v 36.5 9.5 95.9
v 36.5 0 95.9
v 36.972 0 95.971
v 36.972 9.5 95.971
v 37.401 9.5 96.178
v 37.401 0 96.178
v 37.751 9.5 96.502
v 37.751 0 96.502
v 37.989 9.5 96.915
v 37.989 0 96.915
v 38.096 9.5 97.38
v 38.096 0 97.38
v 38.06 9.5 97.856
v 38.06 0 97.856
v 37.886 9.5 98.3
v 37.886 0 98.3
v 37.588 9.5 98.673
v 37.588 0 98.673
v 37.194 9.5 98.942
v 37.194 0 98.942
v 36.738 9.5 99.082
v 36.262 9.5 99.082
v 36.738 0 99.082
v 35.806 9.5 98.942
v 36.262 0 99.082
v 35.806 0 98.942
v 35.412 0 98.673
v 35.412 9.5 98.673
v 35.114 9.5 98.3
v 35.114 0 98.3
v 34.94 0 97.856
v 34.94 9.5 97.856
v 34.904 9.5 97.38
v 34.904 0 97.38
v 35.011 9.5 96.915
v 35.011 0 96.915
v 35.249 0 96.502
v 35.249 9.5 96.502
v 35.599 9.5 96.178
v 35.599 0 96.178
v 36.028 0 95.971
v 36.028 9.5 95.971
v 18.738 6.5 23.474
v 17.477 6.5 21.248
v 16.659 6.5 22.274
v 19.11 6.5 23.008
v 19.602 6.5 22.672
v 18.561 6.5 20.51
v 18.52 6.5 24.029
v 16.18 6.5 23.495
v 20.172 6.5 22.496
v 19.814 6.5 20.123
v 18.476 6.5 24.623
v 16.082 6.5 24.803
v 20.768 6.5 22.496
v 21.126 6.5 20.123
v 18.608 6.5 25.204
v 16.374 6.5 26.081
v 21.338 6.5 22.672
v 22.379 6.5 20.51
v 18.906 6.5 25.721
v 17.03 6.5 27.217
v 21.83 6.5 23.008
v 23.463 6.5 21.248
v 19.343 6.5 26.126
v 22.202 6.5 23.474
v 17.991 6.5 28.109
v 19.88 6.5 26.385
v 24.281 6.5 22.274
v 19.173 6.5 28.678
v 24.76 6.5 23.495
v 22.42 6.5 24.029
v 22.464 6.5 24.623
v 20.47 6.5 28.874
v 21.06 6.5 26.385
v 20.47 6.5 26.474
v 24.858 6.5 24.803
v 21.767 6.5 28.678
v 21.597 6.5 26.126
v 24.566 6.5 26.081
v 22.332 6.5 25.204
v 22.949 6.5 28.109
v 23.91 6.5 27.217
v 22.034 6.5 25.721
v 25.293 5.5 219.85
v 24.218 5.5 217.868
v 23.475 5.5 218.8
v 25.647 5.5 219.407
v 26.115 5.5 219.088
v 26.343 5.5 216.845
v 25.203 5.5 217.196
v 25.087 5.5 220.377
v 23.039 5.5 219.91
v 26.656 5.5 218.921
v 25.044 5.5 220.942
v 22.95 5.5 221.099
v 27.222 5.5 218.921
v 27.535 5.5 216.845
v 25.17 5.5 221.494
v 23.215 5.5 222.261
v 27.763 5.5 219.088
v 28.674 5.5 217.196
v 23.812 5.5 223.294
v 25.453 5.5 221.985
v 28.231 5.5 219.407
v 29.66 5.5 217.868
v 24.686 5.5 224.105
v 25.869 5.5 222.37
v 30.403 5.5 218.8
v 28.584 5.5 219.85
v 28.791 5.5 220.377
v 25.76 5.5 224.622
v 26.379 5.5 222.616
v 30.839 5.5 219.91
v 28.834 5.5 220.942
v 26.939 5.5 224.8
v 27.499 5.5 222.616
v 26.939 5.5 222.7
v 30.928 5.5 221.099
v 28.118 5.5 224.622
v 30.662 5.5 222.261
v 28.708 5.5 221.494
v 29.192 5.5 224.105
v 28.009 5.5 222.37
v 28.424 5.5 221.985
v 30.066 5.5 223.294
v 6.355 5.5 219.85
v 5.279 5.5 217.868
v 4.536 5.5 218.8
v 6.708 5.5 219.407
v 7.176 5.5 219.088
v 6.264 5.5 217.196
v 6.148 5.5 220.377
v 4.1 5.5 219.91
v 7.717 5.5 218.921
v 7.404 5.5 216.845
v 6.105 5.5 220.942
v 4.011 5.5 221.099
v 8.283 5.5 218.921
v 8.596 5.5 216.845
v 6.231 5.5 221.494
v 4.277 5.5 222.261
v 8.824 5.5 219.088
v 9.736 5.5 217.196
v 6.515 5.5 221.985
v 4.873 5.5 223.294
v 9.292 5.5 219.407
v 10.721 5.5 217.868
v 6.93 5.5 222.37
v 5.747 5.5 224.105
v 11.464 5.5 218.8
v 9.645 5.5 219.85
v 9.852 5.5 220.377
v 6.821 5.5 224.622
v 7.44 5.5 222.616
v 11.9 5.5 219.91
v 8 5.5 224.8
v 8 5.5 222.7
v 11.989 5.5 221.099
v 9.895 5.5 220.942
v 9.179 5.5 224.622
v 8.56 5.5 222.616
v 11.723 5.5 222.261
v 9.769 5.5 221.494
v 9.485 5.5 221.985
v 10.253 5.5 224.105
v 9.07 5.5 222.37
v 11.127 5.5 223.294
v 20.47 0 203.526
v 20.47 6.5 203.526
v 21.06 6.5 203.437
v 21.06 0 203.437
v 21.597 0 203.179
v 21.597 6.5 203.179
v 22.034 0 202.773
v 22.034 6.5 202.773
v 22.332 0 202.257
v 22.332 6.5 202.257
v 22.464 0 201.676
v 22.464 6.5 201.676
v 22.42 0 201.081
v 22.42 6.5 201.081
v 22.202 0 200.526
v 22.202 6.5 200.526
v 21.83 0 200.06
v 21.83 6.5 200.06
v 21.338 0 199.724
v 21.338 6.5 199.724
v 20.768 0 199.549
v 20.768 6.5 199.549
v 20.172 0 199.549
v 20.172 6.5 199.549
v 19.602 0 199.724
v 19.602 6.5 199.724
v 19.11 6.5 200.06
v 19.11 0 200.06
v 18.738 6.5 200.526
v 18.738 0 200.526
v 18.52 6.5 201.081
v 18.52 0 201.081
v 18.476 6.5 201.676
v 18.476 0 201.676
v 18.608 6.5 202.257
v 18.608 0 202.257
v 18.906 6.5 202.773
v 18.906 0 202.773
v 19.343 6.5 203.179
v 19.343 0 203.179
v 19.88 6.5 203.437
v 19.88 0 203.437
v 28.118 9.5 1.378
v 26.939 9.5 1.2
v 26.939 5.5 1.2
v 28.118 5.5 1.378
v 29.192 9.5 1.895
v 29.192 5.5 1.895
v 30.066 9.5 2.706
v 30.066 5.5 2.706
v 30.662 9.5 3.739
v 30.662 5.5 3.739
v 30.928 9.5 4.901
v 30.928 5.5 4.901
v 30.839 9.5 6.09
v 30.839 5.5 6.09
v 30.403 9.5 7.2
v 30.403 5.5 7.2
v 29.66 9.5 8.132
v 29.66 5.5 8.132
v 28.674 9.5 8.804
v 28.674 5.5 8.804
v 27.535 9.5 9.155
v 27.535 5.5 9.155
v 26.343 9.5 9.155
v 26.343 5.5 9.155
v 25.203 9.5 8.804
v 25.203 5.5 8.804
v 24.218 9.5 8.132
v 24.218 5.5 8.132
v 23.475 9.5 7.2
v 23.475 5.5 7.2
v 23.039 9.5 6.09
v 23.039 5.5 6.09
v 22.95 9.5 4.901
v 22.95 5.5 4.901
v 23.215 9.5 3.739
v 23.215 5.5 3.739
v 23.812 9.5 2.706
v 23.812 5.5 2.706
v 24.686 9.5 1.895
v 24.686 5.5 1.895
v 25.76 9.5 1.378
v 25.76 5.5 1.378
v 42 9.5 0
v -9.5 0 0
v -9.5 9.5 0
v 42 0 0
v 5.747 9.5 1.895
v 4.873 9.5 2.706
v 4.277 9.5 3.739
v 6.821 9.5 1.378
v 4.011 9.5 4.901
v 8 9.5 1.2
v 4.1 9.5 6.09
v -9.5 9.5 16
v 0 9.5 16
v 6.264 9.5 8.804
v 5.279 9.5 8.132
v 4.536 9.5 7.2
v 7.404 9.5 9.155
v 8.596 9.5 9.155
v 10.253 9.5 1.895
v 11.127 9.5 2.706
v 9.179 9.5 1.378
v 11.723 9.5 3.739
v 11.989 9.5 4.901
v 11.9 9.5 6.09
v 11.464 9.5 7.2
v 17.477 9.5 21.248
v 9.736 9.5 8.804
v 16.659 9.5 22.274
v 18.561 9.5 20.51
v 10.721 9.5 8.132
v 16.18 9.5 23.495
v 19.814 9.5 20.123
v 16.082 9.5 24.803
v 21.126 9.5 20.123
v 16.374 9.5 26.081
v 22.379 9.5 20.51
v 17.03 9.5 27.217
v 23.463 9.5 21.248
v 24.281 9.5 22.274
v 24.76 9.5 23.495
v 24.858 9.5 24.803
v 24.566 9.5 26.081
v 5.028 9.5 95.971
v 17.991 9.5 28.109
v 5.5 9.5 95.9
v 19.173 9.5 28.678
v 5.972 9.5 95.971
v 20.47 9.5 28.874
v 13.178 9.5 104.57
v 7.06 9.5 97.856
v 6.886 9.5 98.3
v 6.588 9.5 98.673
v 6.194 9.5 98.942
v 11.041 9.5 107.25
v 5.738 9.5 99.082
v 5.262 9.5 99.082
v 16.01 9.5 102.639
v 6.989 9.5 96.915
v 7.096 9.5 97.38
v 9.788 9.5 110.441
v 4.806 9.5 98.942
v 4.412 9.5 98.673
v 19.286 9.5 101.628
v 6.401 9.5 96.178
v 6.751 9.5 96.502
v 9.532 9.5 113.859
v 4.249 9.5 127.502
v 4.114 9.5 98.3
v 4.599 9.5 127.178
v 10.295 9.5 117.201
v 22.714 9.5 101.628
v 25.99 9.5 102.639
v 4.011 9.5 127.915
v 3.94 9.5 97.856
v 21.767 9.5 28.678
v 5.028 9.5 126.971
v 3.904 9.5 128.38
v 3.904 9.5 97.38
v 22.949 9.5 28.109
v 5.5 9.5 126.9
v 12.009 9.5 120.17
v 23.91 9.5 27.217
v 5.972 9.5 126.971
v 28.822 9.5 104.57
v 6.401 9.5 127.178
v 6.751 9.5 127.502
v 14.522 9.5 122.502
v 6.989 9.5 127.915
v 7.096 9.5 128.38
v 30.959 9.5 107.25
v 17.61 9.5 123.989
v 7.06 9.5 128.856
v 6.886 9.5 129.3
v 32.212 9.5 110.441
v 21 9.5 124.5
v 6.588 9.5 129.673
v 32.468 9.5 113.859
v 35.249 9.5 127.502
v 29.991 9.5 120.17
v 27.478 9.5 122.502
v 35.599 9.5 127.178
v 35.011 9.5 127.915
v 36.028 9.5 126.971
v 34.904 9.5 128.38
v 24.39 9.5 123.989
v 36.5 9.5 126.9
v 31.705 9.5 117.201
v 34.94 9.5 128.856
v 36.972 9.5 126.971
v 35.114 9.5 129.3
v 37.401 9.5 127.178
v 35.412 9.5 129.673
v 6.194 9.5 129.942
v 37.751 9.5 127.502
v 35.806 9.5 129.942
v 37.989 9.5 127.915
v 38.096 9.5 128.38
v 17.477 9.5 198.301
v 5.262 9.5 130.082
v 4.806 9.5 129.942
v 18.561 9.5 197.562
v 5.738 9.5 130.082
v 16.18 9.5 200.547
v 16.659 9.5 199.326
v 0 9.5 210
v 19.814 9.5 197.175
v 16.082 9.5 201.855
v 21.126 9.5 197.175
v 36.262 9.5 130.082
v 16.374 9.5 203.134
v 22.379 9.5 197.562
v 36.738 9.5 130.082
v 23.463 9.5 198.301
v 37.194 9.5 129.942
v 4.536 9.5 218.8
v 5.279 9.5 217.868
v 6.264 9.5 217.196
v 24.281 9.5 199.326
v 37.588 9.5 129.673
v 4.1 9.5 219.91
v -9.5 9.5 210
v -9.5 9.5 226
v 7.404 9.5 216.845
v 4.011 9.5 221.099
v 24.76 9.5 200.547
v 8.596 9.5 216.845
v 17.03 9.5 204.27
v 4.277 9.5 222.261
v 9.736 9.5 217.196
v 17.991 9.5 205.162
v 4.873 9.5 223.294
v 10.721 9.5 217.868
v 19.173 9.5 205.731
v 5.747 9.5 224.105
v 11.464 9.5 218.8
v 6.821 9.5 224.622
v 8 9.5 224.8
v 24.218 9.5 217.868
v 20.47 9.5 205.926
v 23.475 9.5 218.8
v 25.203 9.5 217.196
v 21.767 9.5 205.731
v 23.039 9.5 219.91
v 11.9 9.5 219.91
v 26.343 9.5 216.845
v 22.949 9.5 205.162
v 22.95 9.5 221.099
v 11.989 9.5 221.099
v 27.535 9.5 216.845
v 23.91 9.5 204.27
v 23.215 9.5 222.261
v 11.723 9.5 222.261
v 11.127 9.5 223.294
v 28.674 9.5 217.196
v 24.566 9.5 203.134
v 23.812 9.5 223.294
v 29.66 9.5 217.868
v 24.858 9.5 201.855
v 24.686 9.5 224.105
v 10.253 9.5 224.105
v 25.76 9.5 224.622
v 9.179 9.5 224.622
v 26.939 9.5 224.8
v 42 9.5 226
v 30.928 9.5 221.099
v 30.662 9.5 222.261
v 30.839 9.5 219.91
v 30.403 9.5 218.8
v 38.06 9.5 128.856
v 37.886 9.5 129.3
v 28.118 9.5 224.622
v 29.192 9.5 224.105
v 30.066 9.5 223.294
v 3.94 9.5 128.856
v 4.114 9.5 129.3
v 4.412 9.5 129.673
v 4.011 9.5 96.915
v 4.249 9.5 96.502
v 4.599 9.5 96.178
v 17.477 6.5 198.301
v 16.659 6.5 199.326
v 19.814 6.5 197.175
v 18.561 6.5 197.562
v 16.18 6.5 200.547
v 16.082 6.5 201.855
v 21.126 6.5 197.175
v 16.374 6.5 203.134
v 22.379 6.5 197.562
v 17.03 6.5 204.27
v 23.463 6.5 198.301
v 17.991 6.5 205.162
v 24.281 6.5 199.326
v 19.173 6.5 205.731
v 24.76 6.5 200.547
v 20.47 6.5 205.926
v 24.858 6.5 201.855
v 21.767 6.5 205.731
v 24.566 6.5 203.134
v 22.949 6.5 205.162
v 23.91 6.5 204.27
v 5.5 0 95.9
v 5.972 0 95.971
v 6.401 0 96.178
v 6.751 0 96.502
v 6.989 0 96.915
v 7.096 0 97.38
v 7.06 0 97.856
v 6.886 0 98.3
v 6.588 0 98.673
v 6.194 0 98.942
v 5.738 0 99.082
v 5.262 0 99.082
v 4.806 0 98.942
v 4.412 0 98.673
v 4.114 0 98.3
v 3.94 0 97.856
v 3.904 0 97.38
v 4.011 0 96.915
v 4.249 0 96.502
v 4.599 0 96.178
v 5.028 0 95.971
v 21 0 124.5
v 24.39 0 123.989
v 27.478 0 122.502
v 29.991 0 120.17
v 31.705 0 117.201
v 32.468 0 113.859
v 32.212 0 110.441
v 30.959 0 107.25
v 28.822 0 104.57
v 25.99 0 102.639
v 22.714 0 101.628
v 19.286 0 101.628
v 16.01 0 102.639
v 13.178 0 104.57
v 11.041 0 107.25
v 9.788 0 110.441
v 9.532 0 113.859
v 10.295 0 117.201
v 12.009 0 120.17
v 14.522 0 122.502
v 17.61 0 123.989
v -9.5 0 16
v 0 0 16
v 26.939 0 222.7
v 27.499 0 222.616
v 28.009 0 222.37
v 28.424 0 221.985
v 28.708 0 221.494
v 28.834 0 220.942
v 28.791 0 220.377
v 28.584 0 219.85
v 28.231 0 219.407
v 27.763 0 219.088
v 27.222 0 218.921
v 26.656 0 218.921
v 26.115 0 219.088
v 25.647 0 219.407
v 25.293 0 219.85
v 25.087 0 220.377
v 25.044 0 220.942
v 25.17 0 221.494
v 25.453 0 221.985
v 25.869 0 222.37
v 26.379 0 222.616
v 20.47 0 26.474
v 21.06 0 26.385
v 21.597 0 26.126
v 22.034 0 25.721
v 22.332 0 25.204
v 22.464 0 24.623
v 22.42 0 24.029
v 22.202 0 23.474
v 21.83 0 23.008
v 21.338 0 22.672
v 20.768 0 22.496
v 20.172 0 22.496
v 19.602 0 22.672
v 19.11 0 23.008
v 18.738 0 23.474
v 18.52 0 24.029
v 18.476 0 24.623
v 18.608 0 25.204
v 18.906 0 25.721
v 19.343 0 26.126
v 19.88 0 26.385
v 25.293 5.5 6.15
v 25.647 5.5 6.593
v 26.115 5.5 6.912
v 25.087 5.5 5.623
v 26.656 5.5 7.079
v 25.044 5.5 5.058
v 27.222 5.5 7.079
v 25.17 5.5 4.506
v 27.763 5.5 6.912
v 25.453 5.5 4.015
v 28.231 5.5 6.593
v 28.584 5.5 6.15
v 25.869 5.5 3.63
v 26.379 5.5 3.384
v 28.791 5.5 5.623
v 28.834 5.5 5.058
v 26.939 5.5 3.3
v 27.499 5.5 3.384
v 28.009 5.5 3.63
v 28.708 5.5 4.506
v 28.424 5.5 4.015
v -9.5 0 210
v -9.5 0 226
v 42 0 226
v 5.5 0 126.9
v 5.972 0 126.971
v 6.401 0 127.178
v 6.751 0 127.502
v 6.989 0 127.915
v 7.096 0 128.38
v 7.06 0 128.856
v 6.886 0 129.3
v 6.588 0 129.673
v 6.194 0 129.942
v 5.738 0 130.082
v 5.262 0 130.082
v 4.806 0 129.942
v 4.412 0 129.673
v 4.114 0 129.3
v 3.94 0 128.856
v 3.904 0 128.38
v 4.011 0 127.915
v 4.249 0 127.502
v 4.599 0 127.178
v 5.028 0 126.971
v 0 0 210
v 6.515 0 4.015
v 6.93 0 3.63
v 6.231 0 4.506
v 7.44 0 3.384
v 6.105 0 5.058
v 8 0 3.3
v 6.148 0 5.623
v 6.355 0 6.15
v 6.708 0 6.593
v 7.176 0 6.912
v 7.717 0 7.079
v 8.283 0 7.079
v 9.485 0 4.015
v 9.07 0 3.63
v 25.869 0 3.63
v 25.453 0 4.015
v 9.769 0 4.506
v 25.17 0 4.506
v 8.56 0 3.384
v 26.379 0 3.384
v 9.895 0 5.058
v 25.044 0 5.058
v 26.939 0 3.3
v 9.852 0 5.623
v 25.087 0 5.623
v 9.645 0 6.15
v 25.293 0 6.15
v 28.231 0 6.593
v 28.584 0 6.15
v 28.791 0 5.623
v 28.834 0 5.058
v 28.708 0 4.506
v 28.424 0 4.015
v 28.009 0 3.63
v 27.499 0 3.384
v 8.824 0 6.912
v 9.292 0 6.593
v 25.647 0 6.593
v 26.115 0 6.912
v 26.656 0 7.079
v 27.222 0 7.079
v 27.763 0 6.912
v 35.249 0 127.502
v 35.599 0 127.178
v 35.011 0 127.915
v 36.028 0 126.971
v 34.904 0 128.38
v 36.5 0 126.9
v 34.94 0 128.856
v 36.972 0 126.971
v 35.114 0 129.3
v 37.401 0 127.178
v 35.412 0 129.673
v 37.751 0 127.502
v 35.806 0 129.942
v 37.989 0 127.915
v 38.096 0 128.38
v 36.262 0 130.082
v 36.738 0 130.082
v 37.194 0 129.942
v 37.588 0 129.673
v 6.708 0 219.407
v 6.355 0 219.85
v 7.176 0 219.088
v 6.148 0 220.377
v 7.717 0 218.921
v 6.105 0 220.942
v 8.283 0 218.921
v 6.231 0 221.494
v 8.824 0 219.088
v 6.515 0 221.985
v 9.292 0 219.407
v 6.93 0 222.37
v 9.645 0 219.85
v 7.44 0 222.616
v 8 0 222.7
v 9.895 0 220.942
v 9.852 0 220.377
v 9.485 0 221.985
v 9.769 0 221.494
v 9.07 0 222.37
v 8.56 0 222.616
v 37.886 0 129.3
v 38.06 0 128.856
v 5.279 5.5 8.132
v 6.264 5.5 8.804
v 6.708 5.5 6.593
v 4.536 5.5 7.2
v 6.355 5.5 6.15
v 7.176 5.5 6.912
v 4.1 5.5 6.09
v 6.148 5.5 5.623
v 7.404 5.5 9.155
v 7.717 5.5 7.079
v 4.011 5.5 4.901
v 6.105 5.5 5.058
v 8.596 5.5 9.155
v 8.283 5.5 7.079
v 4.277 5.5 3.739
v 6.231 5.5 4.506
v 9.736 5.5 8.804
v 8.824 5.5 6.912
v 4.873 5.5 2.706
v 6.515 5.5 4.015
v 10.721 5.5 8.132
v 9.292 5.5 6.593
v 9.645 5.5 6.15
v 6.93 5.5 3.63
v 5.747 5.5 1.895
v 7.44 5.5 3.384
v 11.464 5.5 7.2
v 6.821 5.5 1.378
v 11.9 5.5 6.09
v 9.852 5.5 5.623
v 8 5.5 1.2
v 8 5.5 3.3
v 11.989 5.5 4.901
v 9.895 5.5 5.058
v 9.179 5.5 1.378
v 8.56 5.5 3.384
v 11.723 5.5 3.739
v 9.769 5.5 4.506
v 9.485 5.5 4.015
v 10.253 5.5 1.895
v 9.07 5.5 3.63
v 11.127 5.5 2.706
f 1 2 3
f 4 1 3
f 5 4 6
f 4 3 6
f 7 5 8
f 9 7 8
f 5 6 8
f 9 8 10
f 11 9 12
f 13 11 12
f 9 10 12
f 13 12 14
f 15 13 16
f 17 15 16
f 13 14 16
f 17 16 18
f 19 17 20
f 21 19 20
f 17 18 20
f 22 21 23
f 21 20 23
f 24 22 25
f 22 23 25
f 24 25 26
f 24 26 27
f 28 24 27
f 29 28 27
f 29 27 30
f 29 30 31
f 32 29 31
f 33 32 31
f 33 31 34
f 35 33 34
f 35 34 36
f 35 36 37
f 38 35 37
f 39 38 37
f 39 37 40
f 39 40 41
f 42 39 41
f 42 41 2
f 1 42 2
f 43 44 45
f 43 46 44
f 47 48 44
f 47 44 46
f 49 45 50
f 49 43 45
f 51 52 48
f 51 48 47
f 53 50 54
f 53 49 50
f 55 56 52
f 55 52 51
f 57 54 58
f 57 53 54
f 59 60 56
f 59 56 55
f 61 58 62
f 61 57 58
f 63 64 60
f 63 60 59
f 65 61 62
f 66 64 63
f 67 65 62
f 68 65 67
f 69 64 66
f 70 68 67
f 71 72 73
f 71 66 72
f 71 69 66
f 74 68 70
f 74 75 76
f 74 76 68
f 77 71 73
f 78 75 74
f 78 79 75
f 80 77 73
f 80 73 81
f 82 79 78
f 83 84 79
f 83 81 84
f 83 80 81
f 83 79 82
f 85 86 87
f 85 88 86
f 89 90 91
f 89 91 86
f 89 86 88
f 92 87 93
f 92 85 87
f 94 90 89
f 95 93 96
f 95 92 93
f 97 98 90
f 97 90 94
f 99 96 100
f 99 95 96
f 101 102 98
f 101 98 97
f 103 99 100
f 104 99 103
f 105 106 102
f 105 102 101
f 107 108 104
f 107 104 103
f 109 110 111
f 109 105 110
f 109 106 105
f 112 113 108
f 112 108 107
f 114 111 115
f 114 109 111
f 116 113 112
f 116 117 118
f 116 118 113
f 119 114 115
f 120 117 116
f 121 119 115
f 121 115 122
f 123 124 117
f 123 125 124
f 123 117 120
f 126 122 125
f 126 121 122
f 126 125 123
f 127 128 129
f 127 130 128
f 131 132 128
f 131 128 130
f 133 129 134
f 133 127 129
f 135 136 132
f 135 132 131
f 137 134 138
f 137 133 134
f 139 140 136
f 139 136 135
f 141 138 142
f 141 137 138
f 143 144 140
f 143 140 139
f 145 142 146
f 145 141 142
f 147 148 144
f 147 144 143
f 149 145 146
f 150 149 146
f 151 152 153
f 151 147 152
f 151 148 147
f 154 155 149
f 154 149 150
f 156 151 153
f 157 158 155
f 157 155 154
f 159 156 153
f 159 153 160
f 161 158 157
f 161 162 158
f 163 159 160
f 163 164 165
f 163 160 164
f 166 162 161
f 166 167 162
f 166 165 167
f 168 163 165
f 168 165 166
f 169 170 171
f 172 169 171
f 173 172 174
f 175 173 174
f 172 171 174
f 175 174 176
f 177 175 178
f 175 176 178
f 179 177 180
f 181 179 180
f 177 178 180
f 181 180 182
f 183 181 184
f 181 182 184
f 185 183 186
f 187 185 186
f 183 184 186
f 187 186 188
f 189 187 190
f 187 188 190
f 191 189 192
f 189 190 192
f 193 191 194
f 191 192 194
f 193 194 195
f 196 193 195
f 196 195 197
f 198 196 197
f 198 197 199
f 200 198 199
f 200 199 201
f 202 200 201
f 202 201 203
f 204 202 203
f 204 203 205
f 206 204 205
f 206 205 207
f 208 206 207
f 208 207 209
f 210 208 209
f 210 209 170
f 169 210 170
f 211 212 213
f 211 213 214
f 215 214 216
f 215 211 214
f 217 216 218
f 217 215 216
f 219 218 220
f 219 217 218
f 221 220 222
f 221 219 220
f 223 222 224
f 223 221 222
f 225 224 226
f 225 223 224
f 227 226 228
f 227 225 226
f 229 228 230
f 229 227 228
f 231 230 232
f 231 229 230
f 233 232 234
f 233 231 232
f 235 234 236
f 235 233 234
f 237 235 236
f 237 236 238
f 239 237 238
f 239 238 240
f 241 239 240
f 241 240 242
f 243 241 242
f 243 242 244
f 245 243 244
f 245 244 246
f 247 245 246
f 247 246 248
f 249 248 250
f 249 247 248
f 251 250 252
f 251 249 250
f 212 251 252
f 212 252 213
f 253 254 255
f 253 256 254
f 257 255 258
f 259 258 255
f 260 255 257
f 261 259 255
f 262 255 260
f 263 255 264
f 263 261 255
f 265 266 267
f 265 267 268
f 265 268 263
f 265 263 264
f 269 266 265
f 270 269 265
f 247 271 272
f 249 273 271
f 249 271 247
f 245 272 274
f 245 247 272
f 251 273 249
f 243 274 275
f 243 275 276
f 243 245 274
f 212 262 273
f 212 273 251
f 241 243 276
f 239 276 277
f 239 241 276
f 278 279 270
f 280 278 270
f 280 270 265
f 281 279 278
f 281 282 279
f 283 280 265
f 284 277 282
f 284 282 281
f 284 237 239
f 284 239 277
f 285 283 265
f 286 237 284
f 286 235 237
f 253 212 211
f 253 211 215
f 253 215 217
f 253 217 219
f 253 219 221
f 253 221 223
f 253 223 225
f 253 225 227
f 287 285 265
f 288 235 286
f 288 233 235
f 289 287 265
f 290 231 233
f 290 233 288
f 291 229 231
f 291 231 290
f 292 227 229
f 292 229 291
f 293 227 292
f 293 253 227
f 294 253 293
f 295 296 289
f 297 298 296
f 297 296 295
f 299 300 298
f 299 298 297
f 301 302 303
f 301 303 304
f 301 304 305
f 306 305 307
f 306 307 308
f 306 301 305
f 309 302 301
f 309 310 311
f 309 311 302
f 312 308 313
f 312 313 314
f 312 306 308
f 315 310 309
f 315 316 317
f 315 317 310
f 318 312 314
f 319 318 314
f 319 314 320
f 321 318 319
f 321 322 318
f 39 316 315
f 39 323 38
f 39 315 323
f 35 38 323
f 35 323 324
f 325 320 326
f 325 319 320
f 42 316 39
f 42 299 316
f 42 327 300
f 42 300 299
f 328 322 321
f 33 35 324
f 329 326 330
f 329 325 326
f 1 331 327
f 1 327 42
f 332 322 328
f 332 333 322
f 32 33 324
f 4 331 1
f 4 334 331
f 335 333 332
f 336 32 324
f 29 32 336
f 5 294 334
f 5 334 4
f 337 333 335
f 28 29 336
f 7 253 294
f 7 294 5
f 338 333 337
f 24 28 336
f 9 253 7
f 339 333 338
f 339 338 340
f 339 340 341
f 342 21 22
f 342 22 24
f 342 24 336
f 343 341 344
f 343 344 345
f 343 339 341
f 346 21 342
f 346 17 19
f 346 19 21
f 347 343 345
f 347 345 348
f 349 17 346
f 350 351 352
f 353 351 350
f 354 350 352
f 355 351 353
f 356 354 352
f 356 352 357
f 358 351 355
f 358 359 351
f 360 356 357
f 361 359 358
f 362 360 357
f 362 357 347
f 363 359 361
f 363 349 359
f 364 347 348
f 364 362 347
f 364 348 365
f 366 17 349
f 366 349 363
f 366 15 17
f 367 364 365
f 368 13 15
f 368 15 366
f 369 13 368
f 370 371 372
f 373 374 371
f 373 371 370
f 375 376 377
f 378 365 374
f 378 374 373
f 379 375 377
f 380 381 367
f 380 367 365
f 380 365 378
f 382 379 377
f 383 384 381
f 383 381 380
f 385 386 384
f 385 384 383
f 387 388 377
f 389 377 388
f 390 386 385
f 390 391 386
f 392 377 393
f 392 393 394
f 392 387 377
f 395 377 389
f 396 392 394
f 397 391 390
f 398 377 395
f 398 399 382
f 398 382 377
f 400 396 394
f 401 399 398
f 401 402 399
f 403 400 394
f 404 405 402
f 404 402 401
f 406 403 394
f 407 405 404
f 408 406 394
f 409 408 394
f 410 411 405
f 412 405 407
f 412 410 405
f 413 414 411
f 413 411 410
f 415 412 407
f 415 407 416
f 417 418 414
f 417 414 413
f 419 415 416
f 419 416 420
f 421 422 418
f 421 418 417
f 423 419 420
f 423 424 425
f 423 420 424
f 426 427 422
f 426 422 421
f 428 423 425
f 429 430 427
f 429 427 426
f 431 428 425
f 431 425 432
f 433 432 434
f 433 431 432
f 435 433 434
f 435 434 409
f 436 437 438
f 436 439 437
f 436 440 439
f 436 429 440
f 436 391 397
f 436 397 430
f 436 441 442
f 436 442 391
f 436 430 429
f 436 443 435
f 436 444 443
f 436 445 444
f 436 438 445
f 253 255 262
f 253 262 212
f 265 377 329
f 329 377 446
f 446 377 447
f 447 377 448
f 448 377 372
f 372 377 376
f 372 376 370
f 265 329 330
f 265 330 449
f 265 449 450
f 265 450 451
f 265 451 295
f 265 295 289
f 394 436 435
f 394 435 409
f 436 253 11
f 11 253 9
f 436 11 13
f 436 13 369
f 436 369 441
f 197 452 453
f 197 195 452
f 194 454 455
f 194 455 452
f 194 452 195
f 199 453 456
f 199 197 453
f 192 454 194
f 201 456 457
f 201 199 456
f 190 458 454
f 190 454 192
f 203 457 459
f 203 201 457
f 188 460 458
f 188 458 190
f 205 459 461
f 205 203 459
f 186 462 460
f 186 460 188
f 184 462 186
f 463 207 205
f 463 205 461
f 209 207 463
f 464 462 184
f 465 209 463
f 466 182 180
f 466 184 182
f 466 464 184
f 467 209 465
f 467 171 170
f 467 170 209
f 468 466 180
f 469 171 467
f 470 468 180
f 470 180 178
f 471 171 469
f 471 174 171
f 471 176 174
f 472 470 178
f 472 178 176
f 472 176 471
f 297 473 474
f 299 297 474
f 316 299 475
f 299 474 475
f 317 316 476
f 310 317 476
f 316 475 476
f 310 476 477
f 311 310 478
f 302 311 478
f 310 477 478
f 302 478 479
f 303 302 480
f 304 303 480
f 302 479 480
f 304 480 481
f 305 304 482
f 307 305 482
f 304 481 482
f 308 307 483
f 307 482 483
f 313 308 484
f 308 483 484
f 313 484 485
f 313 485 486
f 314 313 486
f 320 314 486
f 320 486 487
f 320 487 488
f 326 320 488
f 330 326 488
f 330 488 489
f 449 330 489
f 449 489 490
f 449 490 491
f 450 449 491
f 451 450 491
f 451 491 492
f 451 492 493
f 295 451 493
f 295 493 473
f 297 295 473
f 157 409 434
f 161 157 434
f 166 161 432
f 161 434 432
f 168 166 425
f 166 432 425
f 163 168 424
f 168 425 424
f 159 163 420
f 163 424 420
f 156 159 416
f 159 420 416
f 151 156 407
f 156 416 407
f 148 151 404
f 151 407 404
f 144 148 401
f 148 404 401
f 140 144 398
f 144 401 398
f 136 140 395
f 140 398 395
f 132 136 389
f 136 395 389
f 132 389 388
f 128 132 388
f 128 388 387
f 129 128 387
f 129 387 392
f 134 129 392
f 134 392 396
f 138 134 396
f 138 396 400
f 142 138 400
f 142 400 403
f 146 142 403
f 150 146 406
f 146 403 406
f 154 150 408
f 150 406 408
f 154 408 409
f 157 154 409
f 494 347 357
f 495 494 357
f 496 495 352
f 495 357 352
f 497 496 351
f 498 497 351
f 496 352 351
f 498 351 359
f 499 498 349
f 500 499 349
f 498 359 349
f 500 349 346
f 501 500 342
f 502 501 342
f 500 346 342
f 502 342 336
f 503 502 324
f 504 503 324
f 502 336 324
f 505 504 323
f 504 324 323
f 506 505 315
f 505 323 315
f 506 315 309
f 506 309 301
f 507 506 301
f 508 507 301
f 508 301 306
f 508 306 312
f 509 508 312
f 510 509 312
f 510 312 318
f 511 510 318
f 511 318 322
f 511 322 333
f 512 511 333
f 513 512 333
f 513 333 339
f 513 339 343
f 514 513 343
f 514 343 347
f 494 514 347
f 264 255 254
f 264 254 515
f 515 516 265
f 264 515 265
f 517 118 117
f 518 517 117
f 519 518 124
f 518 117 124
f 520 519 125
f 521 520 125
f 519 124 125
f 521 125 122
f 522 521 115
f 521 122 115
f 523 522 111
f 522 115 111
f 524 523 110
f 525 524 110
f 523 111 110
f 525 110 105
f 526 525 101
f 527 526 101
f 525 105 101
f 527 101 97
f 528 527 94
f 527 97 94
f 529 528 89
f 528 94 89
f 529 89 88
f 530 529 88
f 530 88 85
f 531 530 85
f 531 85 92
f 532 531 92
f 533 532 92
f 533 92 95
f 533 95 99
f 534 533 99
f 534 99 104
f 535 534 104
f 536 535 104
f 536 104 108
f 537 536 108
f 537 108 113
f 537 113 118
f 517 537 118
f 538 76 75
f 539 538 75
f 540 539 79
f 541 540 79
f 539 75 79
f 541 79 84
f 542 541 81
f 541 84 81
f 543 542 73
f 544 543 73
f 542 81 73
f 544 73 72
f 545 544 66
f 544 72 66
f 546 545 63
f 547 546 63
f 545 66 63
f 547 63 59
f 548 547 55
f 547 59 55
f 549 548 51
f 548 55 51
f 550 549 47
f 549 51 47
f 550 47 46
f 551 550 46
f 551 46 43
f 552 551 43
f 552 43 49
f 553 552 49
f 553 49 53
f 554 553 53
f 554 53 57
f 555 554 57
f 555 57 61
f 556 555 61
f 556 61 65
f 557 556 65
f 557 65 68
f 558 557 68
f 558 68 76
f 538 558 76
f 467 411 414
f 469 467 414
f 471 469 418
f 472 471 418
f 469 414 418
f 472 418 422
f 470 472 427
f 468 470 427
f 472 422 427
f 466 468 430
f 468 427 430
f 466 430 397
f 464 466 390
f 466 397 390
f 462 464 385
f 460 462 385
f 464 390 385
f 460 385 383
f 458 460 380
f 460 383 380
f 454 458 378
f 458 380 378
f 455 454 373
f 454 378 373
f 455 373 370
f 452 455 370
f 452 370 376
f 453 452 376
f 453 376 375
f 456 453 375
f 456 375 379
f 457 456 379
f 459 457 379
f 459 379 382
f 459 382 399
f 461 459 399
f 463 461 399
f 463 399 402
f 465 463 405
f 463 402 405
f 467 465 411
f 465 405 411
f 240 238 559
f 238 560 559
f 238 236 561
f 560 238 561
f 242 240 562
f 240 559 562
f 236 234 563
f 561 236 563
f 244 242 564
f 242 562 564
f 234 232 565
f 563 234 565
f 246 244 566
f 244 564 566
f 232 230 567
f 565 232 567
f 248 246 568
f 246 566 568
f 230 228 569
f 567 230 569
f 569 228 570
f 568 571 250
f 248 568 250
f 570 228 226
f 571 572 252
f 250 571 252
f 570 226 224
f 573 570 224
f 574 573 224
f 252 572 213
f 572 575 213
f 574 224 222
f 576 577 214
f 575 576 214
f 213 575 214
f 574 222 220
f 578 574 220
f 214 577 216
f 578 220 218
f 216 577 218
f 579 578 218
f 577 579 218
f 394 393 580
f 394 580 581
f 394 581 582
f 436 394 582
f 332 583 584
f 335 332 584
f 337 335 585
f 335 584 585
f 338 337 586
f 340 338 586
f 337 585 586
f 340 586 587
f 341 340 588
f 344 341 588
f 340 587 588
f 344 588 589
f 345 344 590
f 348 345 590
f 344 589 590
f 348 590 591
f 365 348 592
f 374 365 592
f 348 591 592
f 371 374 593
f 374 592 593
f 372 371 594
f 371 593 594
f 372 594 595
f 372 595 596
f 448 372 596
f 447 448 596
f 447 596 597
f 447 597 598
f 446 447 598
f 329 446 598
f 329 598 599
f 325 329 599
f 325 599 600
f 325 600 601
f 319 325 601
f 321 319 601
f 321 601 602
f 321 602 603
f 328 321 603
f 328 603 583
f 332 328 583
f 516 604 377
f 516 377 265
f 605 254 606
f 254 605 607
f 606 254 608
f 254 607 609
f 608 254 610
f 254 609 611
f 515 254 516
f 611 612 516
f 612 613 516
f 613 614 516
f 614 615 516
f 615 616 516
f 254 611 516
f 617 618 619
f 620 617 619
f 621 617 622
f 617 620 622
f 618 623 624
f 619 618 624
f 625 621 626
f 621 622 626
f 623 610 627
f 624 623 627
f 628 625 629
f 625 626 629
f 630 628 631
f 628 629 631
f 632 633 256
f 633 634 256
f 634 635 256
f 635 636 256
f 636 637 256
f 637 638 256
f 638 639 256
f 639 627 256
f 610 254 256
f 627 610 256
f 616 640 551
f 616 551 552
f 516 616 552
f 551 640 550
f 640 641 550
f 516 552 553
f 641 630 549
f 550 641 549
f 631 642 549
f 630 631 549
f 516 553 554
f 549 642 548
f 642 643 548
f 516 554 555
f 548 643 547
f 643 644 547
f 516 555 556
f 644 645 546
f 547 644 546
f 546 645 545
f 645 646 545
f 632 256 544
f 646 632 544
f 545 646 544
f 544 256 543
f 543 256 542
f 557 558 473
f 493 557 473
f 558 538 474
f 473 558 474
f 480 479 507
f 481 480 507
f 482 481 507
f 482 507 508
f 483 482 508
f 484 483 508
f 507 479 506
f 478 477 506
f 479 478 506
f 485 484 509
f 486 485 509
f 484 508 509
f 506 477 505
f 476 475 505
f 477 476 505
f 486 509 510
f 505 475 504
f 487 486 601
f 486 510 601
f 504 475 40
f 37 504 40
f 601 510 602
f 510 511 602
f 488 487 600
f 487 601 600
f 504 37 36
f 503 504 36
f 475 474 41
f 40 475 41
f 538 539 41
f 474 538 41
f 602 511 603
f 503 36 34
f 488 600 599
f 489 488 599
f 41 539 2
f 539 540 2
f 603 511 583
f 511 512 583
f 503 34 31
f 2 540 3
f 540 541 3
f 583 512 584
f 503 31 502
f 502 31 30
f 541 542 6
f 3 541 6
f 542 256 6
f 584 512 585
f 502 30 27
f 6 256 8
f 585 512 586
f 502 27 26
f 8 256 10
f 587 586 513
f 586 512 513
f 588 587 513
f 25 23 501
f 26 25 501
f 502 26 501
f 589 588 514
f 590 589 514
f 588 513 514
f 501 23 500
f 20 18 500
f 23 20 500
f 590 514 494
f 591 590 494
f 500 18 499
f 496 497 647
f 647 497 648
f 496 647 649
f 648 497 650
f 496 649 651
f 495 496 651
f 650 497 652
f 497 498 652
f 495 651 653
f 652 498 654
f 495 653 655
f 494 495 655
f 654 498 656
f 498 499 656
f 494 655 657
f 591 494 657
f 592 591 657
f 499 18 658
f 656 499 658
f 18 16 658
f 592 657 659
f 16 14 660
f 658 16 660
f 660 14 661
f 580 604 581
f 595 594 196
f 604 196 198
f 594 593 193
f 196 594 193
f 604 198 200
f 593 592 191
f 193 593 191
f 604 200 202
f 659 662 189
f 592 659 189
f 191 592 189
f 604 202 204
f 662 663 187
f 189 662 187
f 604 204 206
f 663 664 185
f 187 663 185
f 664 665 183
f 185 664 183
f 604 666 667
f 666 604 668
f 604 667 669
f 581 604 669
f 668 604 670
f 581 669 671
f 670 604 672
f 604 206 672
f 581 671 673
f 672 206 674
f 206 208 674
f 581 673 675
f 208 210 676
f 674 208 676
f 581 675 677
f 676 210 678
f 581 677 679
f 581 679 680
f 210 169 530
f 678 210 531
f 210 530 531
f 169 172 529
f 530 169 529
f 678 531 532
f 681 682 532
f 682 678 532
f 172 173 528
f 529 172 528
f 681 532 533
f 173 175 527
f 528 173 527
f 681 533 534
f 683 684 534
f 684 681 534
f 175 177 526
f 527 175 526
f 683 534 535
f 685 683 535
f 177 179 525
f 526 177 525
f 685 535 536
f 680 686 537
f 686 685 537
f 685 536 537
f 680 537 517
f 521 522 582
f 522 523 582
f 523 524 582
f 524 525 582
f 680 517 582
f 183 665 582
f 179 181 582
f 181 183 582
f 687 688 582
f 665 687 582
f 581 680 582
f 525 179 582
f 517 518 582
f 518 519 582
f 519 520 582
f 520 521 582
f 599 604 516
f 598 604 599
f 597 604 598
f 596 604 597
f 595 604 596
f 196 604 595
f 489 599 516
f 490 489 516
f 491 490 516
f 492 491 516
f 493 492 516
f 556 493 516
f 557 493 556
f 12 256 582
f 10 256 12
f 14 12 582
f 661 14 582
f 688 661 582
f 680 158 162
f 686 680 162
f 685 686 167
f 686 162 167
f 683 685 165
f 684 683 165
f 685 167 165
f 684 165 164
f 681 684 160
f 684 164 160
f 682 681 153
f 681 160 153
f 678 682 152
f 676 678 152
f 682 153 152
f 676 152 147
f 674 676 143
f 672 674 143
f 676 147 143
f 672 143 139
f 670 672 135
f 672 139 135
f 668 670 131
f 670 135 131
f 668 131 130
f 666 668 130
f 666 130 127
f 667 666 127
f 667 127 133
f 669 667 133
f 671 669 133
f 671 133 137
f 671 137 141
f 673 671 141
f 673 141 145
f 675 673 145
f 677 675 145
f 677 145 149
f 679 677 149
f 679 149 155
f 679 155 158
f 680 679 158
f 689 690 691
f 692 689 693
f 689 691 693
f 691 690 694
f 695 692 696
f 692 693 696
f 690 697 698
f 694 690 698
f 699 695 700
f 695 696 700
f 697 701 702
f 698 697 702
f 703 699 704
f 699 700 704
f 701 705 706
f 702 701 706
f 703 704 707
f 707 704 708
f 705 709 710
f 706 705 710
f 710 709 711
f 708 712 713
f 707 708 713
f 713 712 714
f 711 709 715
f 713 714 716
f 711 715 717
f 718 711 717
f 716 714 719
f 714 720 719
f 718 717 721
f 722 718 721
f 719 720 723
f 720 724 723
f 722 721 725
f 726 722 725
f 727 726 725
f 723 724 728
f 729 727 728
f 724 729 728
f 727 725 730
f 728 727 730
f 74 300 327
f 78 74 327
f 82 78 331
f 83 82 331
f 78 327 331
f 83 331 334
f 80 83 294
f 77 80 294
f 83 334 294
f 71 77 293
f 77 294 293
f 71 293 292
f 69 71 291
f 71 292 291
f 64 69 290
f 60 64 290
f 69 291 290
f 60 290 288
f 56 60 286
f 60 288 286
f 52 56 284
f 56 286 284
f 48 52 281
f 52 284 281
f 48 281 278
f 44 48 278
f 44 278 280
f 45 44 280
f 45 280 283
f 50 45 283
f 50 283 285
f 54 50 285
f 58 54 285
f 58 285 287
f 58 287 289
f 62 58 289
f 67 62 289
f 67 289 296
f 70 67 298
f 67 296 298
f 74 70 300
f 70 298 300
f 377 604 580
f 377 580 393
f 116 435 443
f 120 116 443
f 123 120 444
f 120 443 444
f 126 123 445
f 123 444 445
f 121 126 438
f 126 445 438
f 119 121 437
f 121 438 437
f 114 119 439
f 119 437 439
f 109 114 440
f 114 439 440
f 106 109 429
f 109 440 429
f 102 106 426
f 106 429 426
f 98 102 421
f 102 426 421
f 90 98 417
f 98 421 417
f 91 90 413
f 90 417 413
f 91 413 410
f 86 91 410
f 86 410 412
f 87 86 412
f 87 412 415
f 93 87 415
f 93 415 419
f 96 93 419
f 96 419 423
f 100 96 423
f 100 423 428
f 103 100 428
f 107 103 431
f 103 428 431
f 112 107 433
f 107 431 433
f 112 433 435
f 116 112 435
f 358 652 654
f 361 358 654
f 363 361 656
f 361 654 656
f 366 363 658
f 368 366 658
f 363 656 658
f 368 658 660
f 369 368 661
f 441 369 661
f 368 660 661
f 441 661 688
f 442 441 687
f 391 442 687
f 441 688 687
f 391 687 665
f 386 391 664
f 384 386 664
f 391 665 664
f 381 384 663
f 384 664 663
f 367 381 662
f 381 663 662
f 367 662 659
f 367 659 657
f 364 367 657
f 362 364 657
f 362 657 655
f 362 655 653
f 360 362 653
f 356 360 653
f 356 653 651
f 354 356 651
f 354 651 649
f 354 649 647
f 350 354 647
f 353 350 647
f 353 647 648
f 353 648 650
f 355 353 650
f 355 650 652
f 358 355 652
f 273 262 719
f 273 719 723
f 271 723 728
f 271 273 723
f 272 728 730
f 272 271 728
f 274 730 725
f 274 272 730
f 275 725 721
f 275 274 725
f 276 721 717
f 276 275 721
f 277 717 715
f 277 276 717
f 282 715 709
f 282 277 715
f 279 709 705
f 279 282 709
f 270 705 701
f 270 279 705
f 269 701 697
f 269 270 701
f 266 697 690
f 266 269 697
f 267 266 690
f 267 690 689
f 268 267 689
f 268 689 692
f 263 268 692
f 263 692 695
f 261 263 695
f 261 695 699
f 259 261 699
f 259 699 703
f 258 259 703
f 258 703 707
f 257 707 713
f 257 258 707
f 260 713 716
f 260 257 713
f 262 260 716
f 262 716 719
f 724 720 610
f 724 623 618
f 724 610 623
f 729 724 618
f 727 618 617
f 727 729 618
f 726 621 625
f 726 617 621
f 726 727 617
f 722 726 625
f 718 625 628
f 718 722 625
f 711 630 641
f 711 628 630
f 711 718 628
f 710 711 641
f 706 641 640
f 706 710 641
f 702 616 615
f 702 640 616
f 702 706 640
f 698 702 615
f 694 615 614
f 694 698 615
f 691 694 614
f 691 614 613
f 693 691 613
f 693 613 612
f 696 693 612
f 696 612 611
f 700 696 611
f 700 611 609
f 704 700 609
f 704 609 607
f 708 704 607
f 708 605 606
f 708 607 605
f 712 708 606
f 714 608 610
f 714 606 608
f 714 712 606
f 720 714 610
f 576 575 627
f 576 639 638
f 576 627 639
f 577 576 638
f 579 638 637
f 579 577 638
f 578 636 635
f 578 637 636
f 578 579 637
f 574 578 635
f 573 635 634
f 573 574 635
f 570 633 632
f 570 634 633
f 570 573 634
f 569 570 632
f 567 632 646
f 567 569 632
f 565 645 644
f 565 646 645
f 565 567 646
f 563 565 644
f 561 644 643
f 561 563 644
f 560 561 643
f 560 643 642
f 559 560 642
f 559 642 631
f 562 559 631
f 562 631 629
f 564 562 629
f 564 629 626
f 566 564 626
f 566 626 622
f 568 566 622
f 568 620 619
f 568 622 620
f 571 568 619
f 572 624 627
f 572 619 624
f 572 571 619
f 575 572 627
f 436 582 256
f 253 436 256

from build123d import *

# Parameters (mm, degrees)
SKETCH_1_W          = 42
SKETCH_1_H          = 226
EXTRUDE_1_DEPTH     = 9.5
SKETCH_2_R          = 11.5
CUT_EXTRUDE_1_DEPTH = 231.065751471
SKETCH_3_W          = 16
SKETCH_3_H          = 9.5
EXTRUDE_2_DEPTH     = 9.5
SKETCH_4_R          = 4.4
CUT_EXTRUDE_2_DEPTH = 3
SKETCH_5_R          = 1.6
CUT_EXTRUDE_3_DEPTH = 231.065751471
SKETCH_6_R          = 2
CUT_EXTRUDE_6_DEPTH = 231.065751471
SKETCH_7_R          = 1.9
CUT_EXTRUDE_7_DEPTH = 231.065751471
SKETCH_9_R          = 4
CUT_EXTRUDE_8_DEPTH = 4


with BuildPart() as part:
    # 草图1 → 凸台-拉伸1 (new body)
    with BuildSketch(Plane(origin=(0, 0, 0), x_dir=(1, 0, 0), z_dir=(0, 1, 0))):
        with Locations((21, -113)):
            Rectangle(SKETCH_1_W, SKETCH_1_H)
    extrude(amount=EXTRUDE_1_DEPTH)

    # 草图2 → 切除-拉伸1 (cut, through all)
    with BuildSketch(Plane(origin=(0, 9.5, 0), x_dir=(1, 0, 0), z_dir=(0, 1, 0))):
        with Locations(Location((21, -113, 0), (0, 0, 270))):
            Circle(SKETCH_2_R)
    extrude(amount=-CUT_EXTRUDE_1_DEPTH, mode=Mode.SUBTRACT)

    # 草图3 → 凸台-拉伸2 (add)
    with BuildSketch(Plane.ZY):
        with Locations((8, 4.75)):
            Rectangle(SKETCH_3_W, SKETCH_3_H)
        with Locations((218, 4.75)):
            Rectangle(SKETCH_3_W, SKETCH_3_H)
    extrude(amount=EXTRUDE_2_DEPTH)

    # 草图4 → 切除-拉伸2 (cut)
    with BuildSketch(Plane(origin=(0, 9.5, 0), x_dir=(1, 0, 0), z_dir=(0, 1, 0))):
        with Locations(Location((20.47, -201.526194604, 0), (0, 0, 270))):
            Circle(SKETCH_4_R)
        with Locations(Location((20.47, -24.473805396, 0), (0, 0, 270))):
            Circle(SKETCH_4_R)
    extrude(amount=-CUT_EXTRUDE_2_DEPTH, mode=Mode.SUBTRACT)

    # 草图5 → 切除-拉伸3 (cut, through all)
    with BuildSketch(Plane.XZ):
        with Locations(Location((5.5, 97.5, 0), (0, 0, 270))):
            Circle(SKETCH_5_R)
        with Locations(Location((5.5, 128.5, 0), (0, 0, 270))):
            Circle(SKETCH_5_R)
        with Locations(Location((36.5, 97.5, 0), (0, 0, 270))):
            Circle(SKETCH_5_R)
        with Locations(Location((36.5, 128.5, 0), (0, 0, 270))):
            Circle(SKETCH_5_R)
    extrude(amount=-CUT_EXTRUDE_3_DEPTH, mode=Mode.SUBTRACT)

    # 草图6 → 切除-拉伸6 (cut, through all)
    with BuildSketch(Plane(origin=(0, 9.5, 0), x_dir=(1, 0, 0), z_dir=(0, 1, 0))):
        with Locations(Location((20.47, -201.526194604, 0), (0, 0, 270))):
            Circle(SKETCH_6_R)
        with Locations(Location((20.47, -24.473805396, 0), (0, 0, 270))):
            Circle(SKETCH_6_R)
    extrude(amount=-CUT_EXTRUDE_6_DEPTH, mode=Mode.SUBTRACT)

    # 草图7 → 切除-拉伸7 (cut, through all)
    with BuildSketch(Plane(origin=(0, 9.5, 0), x_dir=(1, 0, 0), z_dir=(0, 1, 0))):
        with Locations(Location((8, -220.8, 0), (0, 0, 270))):
            Circle(SKETCH_7_R)
        with Locations(Location((26.938917342, -220.8, 0), (0, 0, 270))):
            Circle(SKETCH_7_R)
    cut_extrude_7 = extrude(amount=-CUT_EXTRUDE_7_DEPTH, mode=Mode.SUBTRACT)

    # 草图9 → 切除-拉伸8 (cut)
    with BuildSketch(Plane(origin=(0, 9.5, 0), x_dir=(1, 0, 0), z_dir=(0, 1, 0))):
        with Locations(Location((8, -220.8, 0), (0, 0, 270))):
            Circle(SKETCH_9_R)
        with Locations(Location((26.938917342, -220.8, 0), (0, 0, 270))):
            Circle(SKETCH_9_R)
    cut_extrude_8 = extrude(amount=-CUT_EXTRUDE_8_DEPTH, mode=Mode.SUBTRACT)

    # 镜向1: 切除-拉伸7, 切除-拉伸8 across plane
    add(cut_extrude_7.mirror(Plane.XY.offset(113)), mode=Mode.SUBTRACT)
    add(cut_extrude_8.mirror(Plane.XY.offset(113)), mode=Mode.SUBTRACT)


solid = part.part
